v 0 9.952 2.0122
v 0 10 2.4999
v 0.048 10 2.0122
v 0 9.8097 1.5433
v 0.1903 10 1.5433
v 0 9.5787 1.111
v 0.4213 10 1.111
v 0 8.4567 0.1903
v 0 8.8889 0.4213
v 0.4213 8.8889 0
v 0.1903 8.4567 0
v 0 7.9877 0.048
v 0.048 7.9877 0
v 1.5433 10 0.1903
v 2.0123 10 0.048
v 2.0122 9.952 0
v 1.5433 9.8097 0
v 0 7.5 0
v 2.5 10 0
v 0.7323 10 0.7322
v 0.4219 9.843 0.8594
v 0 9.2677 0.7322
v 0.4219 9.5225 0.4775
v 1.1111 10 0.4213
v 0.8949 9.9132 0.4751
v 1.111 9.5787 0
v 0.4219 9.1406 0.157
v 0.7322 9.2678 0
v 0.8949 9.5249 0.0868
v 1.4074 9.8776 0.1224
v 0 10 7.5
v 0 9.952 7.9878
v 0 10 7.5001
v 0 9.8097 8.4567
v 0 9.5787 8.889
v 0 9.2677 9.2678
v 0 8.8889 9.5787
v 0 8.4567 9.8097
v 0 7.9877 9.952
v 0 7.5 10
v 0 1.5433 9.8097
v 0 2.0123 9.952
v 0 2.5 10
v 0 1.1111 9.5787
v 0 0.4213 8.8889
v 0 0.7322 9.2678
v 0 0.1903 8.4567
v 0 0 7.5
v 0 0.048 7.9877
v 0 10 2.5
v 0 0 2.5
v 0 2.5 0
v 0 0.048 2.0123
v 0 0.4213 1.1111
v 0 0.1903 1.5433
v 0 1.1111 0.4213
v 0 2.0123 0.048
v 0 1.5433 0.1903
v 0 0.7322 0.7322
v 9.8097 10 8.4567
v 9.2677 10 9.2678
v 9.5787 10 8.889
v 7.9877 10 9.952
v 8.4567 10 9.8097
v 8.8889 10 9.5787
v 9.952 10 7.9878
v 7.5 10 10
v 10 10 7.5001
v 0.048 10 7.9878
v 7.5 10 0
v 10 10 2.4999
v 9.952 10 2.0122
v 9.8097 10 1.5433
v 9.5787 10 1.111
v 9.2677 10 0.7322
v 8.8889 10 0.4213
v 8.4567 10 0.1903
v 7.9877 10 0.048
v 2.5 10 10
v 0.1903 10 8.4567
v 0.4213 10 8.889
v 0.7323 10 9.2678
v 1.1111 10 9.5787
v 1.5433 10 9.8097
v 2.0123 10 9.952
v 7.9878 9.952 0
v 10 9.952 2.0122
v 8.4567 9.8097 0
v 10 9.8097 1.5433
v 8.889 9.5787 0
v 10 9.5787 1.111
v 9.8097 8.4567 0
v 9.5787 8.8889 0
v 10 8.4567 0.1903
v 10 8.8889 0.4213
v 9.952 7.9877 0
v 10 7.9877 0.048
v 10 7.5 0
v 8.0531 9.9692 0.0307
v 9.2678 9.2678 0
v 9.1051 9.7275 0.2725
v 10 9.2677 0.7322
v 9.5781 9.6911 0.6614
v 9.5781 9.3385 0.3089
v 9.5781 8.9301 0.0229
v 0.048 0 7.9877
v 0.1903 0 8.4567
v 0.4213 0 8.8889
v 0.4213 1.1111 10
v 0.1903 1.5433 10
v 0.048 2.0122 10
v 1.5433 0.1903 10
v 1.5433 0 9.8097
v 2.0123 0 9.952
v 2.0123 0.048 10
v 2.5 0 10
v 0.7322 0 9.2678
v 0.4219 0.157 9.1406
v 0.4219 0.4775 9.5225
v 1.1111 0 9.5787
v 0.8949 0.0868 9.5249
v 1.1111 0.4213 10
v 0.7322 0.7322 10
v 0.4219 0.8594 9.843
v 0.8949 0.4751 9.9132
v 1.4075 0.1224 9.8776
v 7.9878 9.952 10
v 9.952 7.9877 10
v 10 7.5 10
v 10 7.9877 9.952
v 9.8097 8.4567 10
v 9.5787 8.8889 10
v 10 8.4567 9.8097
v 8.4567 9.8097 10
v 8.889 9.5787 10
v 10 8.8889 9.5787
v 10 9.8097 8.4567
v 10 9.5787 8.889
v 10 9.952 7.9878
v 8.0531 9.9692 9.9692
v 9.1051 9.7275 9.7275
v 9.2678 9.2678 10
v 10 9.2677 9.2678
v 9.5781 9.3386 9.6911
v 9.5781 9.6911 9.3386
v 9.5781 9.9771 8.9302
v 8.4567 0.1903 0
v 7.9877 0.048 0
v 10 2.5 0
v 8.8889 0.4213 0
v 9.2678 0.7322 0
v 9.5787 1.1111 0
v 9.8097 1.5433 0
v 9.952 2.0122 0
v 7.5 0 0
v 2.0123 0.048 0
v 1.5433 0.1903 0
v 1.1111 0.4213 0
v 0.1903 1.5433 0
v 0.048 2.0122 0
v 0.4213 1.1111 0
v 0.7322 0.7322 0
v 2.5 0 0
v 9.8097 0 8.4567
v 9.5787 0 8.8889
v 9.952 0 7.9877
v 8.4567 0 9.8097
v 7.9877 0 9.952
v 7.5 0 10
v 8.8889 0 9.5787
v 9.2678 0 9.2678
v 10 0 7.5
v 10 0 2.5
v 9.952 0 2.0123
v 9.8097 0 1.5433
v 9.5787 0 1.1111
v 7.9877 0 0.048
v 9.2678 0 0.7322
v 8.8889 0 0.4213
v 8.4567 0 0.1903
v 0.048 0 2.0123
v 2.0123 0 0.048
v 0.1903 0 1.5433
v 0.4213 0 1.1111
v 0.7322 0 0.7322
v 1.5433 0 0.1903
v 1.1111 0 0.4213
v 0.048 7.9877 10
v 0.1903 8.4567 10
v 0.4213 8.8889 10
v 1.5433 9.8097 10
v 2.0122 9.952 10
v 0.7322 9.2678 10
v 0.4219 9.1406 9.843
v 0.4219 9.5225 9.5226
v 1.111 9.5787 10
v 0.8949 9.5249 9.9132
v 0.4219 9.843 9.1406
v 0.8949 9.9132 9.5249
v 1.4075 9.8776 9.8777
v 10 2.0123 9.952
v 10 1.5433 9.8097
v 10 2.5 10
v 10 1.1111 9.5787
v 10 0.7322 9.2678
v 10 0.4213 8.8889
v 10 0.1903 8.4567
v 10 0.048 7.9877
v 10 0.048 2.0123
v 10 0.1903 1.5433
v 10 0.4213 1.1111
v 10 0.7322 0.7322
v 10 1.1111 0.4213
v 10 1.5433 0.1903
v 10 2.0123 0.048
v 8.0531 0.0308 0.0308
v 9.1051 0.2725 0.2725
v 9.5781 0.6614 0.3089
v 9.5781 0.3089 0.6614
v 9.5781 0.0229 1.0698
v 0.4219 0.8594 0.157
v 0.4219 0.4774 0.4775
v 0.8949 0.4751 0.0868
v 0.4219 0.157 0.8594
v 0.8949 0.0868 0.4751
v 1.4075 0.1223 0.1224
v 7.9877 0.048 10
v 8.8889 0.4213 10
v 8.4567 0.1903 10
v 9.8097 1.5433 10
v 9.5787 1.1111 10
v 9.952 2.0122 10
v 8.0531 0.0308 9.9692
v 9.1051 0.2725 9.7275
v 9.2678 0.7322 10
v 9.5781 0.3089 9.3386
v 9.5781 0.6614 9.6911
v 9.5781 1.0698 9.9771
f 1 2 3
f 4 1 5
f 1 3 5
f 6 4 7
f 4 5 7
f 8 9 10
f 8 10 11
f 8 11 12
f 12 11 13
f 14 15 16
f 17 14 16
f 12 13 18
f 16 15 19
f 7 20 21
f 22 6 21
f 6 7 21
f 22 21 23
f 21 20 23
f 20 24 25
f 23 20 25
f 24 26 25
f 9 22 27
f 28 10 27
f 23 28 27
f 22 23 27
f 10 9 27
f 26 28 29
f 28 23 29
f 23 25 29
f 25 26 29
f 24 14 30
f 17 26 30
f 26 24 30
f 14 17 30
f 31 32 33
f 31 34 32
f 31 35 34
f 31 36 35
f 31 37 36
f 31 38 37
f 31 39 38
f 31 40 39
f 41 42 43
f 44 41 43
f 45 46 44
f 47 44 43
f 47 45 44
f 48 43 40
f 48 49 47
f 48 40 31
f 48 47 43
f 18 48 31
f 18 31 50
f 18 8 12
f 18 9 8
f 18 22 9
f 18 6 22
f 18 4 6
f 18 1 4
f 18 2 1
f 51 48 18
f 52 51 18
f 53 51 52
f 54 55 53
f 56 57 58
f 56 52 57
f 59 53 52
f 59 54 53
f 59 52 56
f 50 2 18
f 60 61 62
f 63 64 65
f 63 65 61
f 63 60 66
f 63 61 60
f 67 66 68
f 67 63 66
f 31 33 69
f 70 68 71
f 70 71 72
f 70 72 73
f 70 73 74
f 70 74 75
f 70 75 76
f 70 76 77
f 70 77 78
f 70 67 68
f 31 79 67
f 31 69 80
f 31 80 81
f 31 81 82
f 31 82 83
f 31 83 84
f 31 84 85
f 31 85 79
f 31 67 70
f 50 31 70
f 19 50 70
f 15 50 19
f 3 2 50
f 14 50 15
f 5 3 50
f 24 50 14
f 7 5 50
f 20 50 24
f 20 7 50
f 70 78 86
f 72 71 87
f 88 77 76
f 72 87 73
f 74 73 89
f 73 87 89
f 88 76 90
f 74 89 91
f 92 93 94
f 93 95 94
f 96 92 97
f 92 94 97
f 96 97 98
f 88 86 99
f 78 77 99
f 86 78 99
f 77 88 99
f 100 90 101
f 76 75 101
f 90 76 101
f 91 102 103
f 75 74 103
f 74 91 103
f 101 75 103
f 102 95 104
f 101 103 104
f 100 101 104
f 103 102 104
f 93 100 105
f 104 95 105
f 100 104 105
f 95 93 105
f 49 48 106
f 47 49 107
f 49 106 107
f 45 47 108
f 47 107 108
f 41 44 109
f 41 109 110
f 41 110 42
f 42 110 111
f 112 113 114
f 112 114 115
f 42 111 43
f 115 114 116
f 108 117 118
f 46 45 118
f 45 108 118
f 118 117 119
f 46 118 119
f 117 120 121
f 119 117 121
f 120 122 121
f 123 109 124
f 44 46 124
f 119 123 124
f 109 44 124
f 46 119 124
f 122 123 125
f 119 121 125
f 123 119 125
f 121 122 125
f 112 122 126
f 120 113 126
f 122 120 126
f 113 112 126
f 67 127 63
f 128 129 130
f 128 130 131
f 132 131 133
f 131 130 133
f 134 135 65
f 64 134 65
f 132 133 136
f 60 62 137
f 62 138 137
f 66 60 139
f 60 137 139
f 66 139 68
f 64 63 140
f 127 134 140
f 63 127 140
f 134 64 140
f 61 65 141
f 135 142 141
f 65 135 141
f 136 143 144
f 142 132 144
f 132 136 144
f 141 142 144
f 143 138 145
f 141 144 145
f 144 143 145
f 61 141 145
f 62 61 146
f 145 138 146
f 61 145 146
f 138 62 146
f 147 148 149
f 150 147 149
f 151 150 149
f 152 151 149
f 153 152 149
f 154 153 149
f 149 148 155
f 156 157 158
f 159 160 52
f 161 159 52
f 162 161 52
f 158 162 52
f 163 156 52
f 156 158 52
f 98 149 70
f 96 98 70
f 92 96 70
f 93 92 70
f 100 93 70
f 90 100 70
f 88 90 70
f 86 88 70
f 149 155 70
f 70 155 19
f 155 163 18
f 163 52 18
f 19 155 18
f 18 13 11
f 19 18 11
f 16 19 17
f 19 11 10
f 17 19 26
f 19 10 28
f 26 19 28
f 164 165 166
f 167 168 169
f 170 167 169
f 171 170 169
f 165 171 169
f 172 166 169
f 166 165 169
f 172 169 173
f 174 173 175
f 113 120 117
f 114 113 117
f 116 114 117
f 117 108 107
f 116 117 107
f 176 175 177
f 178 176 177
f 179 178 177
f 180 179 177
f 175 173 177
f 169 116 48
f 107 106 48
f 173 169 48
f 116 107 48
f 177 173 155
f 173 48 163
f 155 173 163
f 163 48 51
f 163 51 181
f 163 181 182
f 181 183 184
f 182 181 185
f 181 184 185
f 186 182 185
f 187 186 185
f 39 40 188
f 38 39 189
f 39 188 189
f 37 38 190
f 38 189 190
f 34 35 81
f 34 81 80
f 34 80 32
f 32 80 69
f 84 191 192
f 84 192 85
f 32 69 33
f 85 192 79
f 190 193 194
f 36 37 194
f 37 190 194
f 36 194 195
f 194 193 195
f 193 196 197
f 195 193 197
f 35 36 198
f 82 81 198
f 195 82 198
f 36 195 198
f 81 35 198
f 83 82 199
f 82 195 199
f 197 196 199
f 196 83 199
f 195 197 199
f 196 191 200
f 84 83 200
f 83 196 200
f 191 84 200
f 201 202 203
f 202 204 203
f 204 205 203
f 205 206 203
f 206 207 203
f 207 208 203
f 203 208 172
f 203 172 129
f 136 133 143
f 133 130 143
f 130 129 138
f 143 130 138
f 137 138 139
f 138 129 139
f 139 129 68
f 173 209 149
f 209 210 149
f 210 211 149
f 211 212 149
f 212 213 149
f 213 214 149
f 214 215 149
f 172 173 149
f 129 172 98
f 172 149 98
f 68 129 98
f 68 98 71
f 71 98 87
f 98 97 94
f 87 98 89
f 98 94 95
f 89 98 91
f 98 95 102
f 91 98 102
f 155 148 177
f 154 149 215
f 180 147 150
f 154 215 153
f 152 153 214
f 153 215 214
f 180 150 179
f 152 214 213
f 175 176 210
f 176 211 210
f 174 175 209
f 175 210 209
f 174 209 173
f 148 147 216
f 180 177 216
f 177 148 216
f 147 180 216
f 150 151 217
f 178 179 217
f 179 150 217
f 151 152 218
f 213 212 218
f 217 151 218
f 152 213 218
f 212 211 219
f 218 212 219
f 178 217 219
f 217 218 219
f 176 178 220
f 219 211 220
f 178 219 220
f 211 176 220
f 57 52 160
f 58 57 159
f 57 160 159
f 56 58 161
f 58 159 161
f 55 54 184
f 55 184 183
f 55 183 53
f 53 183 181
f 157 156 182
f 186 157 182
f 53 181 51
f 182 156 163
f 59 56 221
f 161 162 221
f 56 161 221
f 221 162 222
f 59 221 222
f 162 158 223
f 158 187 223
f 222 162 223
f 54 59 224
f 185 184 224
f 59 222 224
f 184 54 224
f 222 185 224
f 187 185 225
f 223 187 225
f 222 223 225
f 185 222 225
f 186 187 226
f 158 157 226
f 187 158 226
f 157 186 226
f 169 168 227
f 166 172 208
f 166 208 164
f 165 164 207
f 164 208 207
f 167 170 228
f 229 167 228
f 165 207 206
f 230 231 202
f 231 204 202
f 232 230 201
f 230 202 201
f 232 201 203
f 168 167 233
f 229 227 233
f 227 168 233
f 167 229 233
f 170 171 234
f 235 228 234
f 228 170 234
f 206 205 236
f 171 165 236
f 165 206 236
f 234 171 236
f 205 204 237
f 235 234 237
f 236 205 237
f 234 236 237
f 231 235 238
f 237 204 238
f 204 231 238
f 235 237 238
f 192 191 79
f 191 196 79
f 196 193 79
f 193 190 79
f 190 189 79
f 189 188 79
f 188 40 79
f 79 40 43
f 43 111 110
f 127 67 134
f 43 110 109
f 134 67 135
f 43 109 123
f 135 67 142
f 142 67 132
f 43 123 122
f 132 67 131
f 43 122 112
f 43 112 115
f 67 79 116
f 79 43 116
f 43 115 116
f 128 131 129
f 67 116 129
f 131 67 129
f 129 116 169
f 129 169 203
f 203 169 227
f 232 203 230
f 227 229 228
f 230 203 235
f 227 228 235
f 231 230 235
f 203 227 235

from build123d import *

# Parameters (mm, degrees)
PADR_O_LINEAR2_COUNT       = 2
PADR_O_LINEAR2_PITCH       = 5
PADR_O_LINEAR2_2_COUNT     = 2
PADR_O_LINEAR2_2_PITCH     = 5
CORTE_EXTRUS_O1_DEPTH      = 20.114105414
CORTE_EXTRUS_O1_DEPTH_BACK = 20.114105414
ESBO_O3_W                  = 20
ESBO_O3_H                  = 20
ESBO_O3_W_2                = 2.5
ESBO_O3_H_2                = 2.5
CORTE_EXTRUS_O3_DEPTH      = 20
CORTE_EXTRUS_O3_DEPTH_BACK = 10
ESBO_O4_W                  = 20
ESBO_O4_H                  = 20
ESBO_O4_W_2                = 2.5
ESBO_O4_H_2                = 2.5
ESBO_O5_W                  = 10
ESBO_O5_H                  = 10
RESSALTO_EXTRUS_O1_DEPTH   = 5
ESBO_O6_W                  = 10
ESBO_O6_H                  = 10
RESSALTO_EXTRUS_O2_DEPTH   = 5
ESBO_O7_W                  = 10
ESBO_O7_H                  = 10
RESSALTO_EXTRUS_O3_DEPTH   = 5


with BuildPart() as part:
    # Esboço2 → Revolução1 (revolve)
    with BuildSketch(Plane.XY.offset(2.5)):
        with BuildLine():
            Line((3.964466094, 2.5), (2.5, 2.5))
            Line((2.5, 2.5), (-1.035533906, 2.5))
            ThreePointArc((-1.035533906, 2.5), (1.14700975, -0.766407412), (5, 0))
            ThreePointArc((5, 0), (4.233592588, 1.14700975), (3.964466094, 2.5))
        make_face()
        with BuildLine():
            Line((6.035533906, 2.5), (3.964466094, 2.5))
            ThreePointArc((3.964466094, 2.5), (4.233592588, 1.14700975), (5, 0))
            ThreePointArc((5, 0), (5.766407412, 1.14700975), (6.035533906, 2.5))
        make_face()
        with BuildLine():
            ThreePointArc((6.035533906, 2.5), (5.766407412, 1.14700975), (5, 0))
            ThreePointArc((5, 0), (8.85299025, -0.766407412), (11.035533906, 2.5))
            Line((11.035533906, 2.5), (7.5, 2.5))
            Line((7.5, 2.5), (6.035533906, 2.5))
        make_face()
    revolve(axis=Axis((2.5, 2.5, 2.5), (-1, 0, 0)))


with BuildPart() as padr_o_linear2_1:
    # Padrão linear2: pattern copy
    add(part.part.moved(Location(Vector(0, 0, 1) * (1 * PADR_O_LINEAR2_PITCH))))


with BuildPart() as padr_o_linear2_2_1:
    # Padr_o linear2 2: pattern copy
    add(part.part.moved(Location(Vector(0, 1, 0) * (1 * PADR_O_LINEAR2_2_PITCH))))


with BuildPart() as padr_o_linear2_2_2:
    # Padr_o linear2 2: pattern copy
    add(padr_o_linear2_1.part.moved(Location(Vector(0, 1, 0) * (1 * PADR_O_LINEAR2_2_PITCH))))


with BuildPart() as corte_extrus_o1_tool:
    # Esboço3 → Corte-extrusão1 (new, two sides: drawn at the far end of the back side and taken through both)
    with BuildSketch(Plane.XY.offset(-CORTE_EXTRUS_O1_DEPTH_BACK)):
        with Locations((5, 5)):
            Rectangle(ESBO_O3_W, ESBO_O3_H)
        with Locations((1.25, 8.75)):
            Rectangle(ESBO_O3_W_2, ESBO_O3_H_2, mode=Mode.SUBTRACT)
        with Locations((1.25, 1.25)):
            Rectangle(ESBO_O3_W_2, ESBO_O3_H_2, mode=Mode.SUBTRACT)
        with Locations((8.75, 1.25)):
            Rectangle(ESBO_O3_W_2, ESBO_O3_H_2, mode=Mode.SUBTRACT)
        with Locations((8.75, 8.75)):
            Rectangle(ESBO_O3_W_2, ESBO_O3_H_2, mode=Mode.SUBTRACT)
    extrude(amount=CORTE_EXTRUS_O1_DEPTH + CORTE_EXTRUS_O1_DEPTH_BACK)


with BuildPart() as part_1:
    add(part.part)

    # Corte-extrusão1: cut by corte_extrus_o1_tool
    add(corte_extrus_o1_tool.part, mode=Mode.SUBTRACT)


with BuildPart() as padr_o_linear2_1_1:
    add(padr_o_linear2_1.part)

    # Corte-extrusão1: cut by corte_extrus_o1_tool
    add(corte_extrus_o1_tool.part, mode=Mode.SUBTRACT)


with BuildPart() as padr_o_linear2_2_1_1:
    add(padr_o_linear2_2_1.part)

    # Corte-extrusão1: cut by corte_extrus_o1_tool
    add(corte_extrus_o1_tool.part, mode=Mode.SUBTRACT)


with BuildPart() as padr_o_linear2_2_2_1:
    add(padr_o_linear2_2_2.part)

    # Corte-extrusão1: cut by corte_extrus_o1_tool
    add(corte_extrus_o1_tool.part, mode=Mode.SUBTRACT)


with BuildPart() as corte_extrus_o1_piece_1:
    # of the separate pieces the step leaves, piece 1, a body of its own (corte_extrus_o1_pieces)
    add(part_1.part.solids().sort_by_distance((0, 0, 2.5))[0])


with BuildPart() as corte_extrus_o1_piece_2:
    # of the separate pieces the step leaves, piece 2, a body of its own (corte_extrus_o1_pieces)
    add(part_1.part.solids().sort_by_distance((10, 2.5, 5))[0])


with BuildPart() as corte_extrus_o1_piece_1_of_padr_o_linear:
    # of the separate pieces the step leaves, piece 1, a body of its own (corte_extrus_o1_pieces_of_padr_o_linear2)
    add(padr_o_linear2_1_1.part.solids().sort_by_distance((0, 0, 7.5))[0])


with BuildPart() as corte_extrus_o1_piece_2_of_padr_o_linear:
    # of the separate pieces the step leaves, piece 2, a body of its own (corte_extrus_o1_pieces_of_padr_o_linear2)
    add(padr_o_linear2_1_1.part.solids().sort_by_distance((10, 2.5, 10))[0])


with BuildPart() as corte_extrus_o1_piece_1_of_padr_o_li_2:
    # of the separate pieces the step leaves, piece 1, a body of its own (corte_extrus_o1_pieces_of_padr_o_lin_2)
    add(padr_o_linear2_2_1_1.part.solids().sort_by_distance((0, 10, 2.5))[0])


with BuildPart() as corte_extrus_o1_piece_2_of_padr_o_li_2:
    # of the separate pieces the step leaves, piece 2, a body of its own (corte_extrus_o1_pieces_of_padr_o_lin_2)
    add(padr_o_linear2_2_1_1.part.solids().sort_by_distance((7.5, 7.5, 6.035533906))[0])


with BuildPart() as corte_extrus_o1_piece_1_of_padr_o_li_3:
    # of the separate pieces the step leaves, piece 1, a body of its own (corte_extrus_o1_pieces_of_padr_o_lin_3)
    add(padr_o_linear2_2_2_1.part.solids().sort_by_distance((0, 10, 7.5))[0])


with BuildPart() as corte_extrus_o1_piece_2_of_padr_o_li_3:
    # of the separate pieces the step leaves, piece 2, a body of its own (corte_extrus_o1_pieces_of_padr_o_lin_3)
    add(padr_o_linear2_2_2_1.part.solids().sort_by_distance((7.5, 7.5, 11.035533906))[0])


with BuildPart() as corte_extrus_o3_tool:
    # Esboço4 → Corte-extrusão3 (new, two sides: drawn at the far end of the back side and taken through both)
    with BuildSketch(Plane(origin=(0, 0, 0), x_dir=(0, 0, -1), z_dir=(1, 0, 0)).offset(-CORTE_EXTRUS_O3_DEPTH_BACK)):
        with Locations((-5, 5)):
            Rectangle(ESBO_O4_W, ESBO_O4_H)
        with Locations((-8.75, 8.75)):
            Rectangle(ESBO_O4_W_2, ESBO_O4_H_2, mode=Mode.SUBTRACT)
        with Locations((-1.25, 1.25)):
            Rectangle(ESBO_O4_W_2, ESBO_O4_H_2, mode=Mode.SUBTRACT)
        with Locations((-1.25, 8.75)):
            Rectangle(ESBO_O4_W_2, ESBO_O4_H_2, mode=Mode.SUBTRACT)
        with Locations((-8.75, 1.25)):
            Rectangle(ESBO_O4_W_2, ESBO_O4_H_2, mode=Mode.SUBTRACT)
    extrude(amount=CORTE_EXTRUS_O3_DEPTH + CORTE_EXTRUS_O3_DEPTH_BACK)


with BuildPart() as corte_extrus_o1_piece_1_1:
    add(corte_extrus_o1_piece_1.part)

    # Corte-extrusão3: cut by corte_extrus_o3_tool
    add(corte_extrus_o3_tool.part, mode=Mode.SUBTRACT)



with BuildPart() as corte_extrus_o1_piece_2_1:
    add(corte_extrus_o1_piece_2.part)

    # Corte-extrusão3: cut by corte_extrus_o3_tool
    add(corte_extrus_o3_tool.part, mode=Mode.SUBTRACT)


with BuildPart() as corte_extrus_o1_piece_1_of_padr_o_linear_1:
    add(corte_extrus_o1_piece_1_of_padr_o_linear.part)

    # Corte-extrusão3: cut by corte_extrus_o3_tool
    add(corte_extrus_o3_tool.part, mode=Mode.SUBTRACT)


with BuildPart() as corte_extrus_o1_piece_2_of_padr_o_linear_1:
    add(corte_extrus_o1_piece_2_of_padr_o_linear.part)

    # Corte-extrusão3: cut by corte_extrus_o3_tool
    add(corte_extrus_o3_tool.part, mode=Mode.SUBTRACT)


with BuildPart() as corte_extrus_o1_piece_1_of_padr_o_li_2_1:
    add(corte_extrus_o1_piece_1_of_padr_o_li_2.part)

    # Corte-extrusão3: cut by corte_extrus_o3_tool
    add(corte_extrus_o3_tool.part, mode=Mode.SUBTRACT)


with BuildPart() as corte_extrus_o1_piece_2_of_padr_o_li_2_1:
    add(corte_extrus_o1_piece_2_of_padr_o_li_2.part)

    # Corte-extrusão3: cut by corte_extrus_o3_tool
    add(corte_extrus_o3_tool.part, mode=Mode.SUBTRACT)


with BuildPart() as corte_extrus_o1_piece_1_of_padr_o_li_3_1:
    add(corte_extrus_o1_piece_1_of_padr_o_li_3.part)

    # Corte-extrusão3: cut by corte_extrus_o3_tool
    add(corte_extrus_o3_tool.part, mode=Mode.SUBTRACT)


with BuildPart() as corte_extrus_o1_piece_2_of_padr_o_li_3_1:
    add(corte_extrus_o1_piece_2_of_padr_o_li_3.part)

    # Corte-extrusão3: cut by corte_extrus_o3_tool
    add(corte_extrus_o3_tool.part, mode=Mode.SUBTRACT)


with BuildPart() as corte_extrus_o1_piece_1_2:
    add(corte_extrus_o1_piece_1_1.part)

    add(corte_extrus_o1_piece_2_1.part)  # Ressalto-extrusão1 merges Corte-extrusão1 piece 2

    add(corte_extrus_o1_piece_1_of_padr_o_linear_1.part)  # Ressalto-extrusão1 merges Corte-extrusão1 piece 1 of Padr_o linear

    add(corte_extrus_o1_piece_2_of_padr_o_linear_1.part)  # Ressalto-extrusão1 merges Corte-extrusão1 piece 2 of Padr_o linear

    add(corte_extrus_o1_piece_1_of_padr_o_li_2_1.part)  # Ressalto-extrusão1 merges Corte-extrusão1 piece 1 of Padr_o li 2

    add(corte_extrus_o1_piece_2_of_padr_o_li_2_1.part)  # Ressalto-extrusão1 merges Corte-extrusão1 piece 2 of Padr_o li 2

    add(corte_extrus_o1_piece_1_of_padr_o_li_3_1.part)  # Ressalto-extrusão1 merges Corte-extrusão1 piece 1 of Padr_o li 3

    add(corte_extrus_o1_piece_2_of_padr_o_li_3_1.part)  # Ressalto-extrusão1 merges Corte-extrusão1 piece 2 of Padr_o li 3
    # Esboço5 → Ressalto-extrusão1 (add)
    with BuildSketch(Plane.XY.offset(2.5)):
        with Locations((5, 5)):
            Rectangle(ESBO_O5_W, ESBO_O5_H)
    extrude(amount=RESSALTO_EXTRUS_O1_DEPTH)

    # Esboço6 → Ressalto-extrusão2 (add)
    with BuildSketch(Plane(origin=(2.5, 0, 0), x_dir=(0, 0, -1), z_dir=(1, 0, 0))):
        with Locations((-5, 5)):
            Rectangle(ESBO_O6_W, ESBO_O6_H)
    extrude(amount=RESSALTO_EXTRUS_O2_DEPTH)

    # Esboço7 → Ressalto-extrusão3 (add)
    with BuildSketch(Plane(origin=(0, 2.5, 0), x_dir=(1, 0, 0), z_dir=(0, 1, 0))):
        with Locations((5, -5)):
            Rectangle(ESBO_O7_W, ESBO_O7_H)
    extrude(amount=RESSALTO_EXTRUS_O3_DEPTH)


solid = corte_extrus_o1_piece_1_2.part
